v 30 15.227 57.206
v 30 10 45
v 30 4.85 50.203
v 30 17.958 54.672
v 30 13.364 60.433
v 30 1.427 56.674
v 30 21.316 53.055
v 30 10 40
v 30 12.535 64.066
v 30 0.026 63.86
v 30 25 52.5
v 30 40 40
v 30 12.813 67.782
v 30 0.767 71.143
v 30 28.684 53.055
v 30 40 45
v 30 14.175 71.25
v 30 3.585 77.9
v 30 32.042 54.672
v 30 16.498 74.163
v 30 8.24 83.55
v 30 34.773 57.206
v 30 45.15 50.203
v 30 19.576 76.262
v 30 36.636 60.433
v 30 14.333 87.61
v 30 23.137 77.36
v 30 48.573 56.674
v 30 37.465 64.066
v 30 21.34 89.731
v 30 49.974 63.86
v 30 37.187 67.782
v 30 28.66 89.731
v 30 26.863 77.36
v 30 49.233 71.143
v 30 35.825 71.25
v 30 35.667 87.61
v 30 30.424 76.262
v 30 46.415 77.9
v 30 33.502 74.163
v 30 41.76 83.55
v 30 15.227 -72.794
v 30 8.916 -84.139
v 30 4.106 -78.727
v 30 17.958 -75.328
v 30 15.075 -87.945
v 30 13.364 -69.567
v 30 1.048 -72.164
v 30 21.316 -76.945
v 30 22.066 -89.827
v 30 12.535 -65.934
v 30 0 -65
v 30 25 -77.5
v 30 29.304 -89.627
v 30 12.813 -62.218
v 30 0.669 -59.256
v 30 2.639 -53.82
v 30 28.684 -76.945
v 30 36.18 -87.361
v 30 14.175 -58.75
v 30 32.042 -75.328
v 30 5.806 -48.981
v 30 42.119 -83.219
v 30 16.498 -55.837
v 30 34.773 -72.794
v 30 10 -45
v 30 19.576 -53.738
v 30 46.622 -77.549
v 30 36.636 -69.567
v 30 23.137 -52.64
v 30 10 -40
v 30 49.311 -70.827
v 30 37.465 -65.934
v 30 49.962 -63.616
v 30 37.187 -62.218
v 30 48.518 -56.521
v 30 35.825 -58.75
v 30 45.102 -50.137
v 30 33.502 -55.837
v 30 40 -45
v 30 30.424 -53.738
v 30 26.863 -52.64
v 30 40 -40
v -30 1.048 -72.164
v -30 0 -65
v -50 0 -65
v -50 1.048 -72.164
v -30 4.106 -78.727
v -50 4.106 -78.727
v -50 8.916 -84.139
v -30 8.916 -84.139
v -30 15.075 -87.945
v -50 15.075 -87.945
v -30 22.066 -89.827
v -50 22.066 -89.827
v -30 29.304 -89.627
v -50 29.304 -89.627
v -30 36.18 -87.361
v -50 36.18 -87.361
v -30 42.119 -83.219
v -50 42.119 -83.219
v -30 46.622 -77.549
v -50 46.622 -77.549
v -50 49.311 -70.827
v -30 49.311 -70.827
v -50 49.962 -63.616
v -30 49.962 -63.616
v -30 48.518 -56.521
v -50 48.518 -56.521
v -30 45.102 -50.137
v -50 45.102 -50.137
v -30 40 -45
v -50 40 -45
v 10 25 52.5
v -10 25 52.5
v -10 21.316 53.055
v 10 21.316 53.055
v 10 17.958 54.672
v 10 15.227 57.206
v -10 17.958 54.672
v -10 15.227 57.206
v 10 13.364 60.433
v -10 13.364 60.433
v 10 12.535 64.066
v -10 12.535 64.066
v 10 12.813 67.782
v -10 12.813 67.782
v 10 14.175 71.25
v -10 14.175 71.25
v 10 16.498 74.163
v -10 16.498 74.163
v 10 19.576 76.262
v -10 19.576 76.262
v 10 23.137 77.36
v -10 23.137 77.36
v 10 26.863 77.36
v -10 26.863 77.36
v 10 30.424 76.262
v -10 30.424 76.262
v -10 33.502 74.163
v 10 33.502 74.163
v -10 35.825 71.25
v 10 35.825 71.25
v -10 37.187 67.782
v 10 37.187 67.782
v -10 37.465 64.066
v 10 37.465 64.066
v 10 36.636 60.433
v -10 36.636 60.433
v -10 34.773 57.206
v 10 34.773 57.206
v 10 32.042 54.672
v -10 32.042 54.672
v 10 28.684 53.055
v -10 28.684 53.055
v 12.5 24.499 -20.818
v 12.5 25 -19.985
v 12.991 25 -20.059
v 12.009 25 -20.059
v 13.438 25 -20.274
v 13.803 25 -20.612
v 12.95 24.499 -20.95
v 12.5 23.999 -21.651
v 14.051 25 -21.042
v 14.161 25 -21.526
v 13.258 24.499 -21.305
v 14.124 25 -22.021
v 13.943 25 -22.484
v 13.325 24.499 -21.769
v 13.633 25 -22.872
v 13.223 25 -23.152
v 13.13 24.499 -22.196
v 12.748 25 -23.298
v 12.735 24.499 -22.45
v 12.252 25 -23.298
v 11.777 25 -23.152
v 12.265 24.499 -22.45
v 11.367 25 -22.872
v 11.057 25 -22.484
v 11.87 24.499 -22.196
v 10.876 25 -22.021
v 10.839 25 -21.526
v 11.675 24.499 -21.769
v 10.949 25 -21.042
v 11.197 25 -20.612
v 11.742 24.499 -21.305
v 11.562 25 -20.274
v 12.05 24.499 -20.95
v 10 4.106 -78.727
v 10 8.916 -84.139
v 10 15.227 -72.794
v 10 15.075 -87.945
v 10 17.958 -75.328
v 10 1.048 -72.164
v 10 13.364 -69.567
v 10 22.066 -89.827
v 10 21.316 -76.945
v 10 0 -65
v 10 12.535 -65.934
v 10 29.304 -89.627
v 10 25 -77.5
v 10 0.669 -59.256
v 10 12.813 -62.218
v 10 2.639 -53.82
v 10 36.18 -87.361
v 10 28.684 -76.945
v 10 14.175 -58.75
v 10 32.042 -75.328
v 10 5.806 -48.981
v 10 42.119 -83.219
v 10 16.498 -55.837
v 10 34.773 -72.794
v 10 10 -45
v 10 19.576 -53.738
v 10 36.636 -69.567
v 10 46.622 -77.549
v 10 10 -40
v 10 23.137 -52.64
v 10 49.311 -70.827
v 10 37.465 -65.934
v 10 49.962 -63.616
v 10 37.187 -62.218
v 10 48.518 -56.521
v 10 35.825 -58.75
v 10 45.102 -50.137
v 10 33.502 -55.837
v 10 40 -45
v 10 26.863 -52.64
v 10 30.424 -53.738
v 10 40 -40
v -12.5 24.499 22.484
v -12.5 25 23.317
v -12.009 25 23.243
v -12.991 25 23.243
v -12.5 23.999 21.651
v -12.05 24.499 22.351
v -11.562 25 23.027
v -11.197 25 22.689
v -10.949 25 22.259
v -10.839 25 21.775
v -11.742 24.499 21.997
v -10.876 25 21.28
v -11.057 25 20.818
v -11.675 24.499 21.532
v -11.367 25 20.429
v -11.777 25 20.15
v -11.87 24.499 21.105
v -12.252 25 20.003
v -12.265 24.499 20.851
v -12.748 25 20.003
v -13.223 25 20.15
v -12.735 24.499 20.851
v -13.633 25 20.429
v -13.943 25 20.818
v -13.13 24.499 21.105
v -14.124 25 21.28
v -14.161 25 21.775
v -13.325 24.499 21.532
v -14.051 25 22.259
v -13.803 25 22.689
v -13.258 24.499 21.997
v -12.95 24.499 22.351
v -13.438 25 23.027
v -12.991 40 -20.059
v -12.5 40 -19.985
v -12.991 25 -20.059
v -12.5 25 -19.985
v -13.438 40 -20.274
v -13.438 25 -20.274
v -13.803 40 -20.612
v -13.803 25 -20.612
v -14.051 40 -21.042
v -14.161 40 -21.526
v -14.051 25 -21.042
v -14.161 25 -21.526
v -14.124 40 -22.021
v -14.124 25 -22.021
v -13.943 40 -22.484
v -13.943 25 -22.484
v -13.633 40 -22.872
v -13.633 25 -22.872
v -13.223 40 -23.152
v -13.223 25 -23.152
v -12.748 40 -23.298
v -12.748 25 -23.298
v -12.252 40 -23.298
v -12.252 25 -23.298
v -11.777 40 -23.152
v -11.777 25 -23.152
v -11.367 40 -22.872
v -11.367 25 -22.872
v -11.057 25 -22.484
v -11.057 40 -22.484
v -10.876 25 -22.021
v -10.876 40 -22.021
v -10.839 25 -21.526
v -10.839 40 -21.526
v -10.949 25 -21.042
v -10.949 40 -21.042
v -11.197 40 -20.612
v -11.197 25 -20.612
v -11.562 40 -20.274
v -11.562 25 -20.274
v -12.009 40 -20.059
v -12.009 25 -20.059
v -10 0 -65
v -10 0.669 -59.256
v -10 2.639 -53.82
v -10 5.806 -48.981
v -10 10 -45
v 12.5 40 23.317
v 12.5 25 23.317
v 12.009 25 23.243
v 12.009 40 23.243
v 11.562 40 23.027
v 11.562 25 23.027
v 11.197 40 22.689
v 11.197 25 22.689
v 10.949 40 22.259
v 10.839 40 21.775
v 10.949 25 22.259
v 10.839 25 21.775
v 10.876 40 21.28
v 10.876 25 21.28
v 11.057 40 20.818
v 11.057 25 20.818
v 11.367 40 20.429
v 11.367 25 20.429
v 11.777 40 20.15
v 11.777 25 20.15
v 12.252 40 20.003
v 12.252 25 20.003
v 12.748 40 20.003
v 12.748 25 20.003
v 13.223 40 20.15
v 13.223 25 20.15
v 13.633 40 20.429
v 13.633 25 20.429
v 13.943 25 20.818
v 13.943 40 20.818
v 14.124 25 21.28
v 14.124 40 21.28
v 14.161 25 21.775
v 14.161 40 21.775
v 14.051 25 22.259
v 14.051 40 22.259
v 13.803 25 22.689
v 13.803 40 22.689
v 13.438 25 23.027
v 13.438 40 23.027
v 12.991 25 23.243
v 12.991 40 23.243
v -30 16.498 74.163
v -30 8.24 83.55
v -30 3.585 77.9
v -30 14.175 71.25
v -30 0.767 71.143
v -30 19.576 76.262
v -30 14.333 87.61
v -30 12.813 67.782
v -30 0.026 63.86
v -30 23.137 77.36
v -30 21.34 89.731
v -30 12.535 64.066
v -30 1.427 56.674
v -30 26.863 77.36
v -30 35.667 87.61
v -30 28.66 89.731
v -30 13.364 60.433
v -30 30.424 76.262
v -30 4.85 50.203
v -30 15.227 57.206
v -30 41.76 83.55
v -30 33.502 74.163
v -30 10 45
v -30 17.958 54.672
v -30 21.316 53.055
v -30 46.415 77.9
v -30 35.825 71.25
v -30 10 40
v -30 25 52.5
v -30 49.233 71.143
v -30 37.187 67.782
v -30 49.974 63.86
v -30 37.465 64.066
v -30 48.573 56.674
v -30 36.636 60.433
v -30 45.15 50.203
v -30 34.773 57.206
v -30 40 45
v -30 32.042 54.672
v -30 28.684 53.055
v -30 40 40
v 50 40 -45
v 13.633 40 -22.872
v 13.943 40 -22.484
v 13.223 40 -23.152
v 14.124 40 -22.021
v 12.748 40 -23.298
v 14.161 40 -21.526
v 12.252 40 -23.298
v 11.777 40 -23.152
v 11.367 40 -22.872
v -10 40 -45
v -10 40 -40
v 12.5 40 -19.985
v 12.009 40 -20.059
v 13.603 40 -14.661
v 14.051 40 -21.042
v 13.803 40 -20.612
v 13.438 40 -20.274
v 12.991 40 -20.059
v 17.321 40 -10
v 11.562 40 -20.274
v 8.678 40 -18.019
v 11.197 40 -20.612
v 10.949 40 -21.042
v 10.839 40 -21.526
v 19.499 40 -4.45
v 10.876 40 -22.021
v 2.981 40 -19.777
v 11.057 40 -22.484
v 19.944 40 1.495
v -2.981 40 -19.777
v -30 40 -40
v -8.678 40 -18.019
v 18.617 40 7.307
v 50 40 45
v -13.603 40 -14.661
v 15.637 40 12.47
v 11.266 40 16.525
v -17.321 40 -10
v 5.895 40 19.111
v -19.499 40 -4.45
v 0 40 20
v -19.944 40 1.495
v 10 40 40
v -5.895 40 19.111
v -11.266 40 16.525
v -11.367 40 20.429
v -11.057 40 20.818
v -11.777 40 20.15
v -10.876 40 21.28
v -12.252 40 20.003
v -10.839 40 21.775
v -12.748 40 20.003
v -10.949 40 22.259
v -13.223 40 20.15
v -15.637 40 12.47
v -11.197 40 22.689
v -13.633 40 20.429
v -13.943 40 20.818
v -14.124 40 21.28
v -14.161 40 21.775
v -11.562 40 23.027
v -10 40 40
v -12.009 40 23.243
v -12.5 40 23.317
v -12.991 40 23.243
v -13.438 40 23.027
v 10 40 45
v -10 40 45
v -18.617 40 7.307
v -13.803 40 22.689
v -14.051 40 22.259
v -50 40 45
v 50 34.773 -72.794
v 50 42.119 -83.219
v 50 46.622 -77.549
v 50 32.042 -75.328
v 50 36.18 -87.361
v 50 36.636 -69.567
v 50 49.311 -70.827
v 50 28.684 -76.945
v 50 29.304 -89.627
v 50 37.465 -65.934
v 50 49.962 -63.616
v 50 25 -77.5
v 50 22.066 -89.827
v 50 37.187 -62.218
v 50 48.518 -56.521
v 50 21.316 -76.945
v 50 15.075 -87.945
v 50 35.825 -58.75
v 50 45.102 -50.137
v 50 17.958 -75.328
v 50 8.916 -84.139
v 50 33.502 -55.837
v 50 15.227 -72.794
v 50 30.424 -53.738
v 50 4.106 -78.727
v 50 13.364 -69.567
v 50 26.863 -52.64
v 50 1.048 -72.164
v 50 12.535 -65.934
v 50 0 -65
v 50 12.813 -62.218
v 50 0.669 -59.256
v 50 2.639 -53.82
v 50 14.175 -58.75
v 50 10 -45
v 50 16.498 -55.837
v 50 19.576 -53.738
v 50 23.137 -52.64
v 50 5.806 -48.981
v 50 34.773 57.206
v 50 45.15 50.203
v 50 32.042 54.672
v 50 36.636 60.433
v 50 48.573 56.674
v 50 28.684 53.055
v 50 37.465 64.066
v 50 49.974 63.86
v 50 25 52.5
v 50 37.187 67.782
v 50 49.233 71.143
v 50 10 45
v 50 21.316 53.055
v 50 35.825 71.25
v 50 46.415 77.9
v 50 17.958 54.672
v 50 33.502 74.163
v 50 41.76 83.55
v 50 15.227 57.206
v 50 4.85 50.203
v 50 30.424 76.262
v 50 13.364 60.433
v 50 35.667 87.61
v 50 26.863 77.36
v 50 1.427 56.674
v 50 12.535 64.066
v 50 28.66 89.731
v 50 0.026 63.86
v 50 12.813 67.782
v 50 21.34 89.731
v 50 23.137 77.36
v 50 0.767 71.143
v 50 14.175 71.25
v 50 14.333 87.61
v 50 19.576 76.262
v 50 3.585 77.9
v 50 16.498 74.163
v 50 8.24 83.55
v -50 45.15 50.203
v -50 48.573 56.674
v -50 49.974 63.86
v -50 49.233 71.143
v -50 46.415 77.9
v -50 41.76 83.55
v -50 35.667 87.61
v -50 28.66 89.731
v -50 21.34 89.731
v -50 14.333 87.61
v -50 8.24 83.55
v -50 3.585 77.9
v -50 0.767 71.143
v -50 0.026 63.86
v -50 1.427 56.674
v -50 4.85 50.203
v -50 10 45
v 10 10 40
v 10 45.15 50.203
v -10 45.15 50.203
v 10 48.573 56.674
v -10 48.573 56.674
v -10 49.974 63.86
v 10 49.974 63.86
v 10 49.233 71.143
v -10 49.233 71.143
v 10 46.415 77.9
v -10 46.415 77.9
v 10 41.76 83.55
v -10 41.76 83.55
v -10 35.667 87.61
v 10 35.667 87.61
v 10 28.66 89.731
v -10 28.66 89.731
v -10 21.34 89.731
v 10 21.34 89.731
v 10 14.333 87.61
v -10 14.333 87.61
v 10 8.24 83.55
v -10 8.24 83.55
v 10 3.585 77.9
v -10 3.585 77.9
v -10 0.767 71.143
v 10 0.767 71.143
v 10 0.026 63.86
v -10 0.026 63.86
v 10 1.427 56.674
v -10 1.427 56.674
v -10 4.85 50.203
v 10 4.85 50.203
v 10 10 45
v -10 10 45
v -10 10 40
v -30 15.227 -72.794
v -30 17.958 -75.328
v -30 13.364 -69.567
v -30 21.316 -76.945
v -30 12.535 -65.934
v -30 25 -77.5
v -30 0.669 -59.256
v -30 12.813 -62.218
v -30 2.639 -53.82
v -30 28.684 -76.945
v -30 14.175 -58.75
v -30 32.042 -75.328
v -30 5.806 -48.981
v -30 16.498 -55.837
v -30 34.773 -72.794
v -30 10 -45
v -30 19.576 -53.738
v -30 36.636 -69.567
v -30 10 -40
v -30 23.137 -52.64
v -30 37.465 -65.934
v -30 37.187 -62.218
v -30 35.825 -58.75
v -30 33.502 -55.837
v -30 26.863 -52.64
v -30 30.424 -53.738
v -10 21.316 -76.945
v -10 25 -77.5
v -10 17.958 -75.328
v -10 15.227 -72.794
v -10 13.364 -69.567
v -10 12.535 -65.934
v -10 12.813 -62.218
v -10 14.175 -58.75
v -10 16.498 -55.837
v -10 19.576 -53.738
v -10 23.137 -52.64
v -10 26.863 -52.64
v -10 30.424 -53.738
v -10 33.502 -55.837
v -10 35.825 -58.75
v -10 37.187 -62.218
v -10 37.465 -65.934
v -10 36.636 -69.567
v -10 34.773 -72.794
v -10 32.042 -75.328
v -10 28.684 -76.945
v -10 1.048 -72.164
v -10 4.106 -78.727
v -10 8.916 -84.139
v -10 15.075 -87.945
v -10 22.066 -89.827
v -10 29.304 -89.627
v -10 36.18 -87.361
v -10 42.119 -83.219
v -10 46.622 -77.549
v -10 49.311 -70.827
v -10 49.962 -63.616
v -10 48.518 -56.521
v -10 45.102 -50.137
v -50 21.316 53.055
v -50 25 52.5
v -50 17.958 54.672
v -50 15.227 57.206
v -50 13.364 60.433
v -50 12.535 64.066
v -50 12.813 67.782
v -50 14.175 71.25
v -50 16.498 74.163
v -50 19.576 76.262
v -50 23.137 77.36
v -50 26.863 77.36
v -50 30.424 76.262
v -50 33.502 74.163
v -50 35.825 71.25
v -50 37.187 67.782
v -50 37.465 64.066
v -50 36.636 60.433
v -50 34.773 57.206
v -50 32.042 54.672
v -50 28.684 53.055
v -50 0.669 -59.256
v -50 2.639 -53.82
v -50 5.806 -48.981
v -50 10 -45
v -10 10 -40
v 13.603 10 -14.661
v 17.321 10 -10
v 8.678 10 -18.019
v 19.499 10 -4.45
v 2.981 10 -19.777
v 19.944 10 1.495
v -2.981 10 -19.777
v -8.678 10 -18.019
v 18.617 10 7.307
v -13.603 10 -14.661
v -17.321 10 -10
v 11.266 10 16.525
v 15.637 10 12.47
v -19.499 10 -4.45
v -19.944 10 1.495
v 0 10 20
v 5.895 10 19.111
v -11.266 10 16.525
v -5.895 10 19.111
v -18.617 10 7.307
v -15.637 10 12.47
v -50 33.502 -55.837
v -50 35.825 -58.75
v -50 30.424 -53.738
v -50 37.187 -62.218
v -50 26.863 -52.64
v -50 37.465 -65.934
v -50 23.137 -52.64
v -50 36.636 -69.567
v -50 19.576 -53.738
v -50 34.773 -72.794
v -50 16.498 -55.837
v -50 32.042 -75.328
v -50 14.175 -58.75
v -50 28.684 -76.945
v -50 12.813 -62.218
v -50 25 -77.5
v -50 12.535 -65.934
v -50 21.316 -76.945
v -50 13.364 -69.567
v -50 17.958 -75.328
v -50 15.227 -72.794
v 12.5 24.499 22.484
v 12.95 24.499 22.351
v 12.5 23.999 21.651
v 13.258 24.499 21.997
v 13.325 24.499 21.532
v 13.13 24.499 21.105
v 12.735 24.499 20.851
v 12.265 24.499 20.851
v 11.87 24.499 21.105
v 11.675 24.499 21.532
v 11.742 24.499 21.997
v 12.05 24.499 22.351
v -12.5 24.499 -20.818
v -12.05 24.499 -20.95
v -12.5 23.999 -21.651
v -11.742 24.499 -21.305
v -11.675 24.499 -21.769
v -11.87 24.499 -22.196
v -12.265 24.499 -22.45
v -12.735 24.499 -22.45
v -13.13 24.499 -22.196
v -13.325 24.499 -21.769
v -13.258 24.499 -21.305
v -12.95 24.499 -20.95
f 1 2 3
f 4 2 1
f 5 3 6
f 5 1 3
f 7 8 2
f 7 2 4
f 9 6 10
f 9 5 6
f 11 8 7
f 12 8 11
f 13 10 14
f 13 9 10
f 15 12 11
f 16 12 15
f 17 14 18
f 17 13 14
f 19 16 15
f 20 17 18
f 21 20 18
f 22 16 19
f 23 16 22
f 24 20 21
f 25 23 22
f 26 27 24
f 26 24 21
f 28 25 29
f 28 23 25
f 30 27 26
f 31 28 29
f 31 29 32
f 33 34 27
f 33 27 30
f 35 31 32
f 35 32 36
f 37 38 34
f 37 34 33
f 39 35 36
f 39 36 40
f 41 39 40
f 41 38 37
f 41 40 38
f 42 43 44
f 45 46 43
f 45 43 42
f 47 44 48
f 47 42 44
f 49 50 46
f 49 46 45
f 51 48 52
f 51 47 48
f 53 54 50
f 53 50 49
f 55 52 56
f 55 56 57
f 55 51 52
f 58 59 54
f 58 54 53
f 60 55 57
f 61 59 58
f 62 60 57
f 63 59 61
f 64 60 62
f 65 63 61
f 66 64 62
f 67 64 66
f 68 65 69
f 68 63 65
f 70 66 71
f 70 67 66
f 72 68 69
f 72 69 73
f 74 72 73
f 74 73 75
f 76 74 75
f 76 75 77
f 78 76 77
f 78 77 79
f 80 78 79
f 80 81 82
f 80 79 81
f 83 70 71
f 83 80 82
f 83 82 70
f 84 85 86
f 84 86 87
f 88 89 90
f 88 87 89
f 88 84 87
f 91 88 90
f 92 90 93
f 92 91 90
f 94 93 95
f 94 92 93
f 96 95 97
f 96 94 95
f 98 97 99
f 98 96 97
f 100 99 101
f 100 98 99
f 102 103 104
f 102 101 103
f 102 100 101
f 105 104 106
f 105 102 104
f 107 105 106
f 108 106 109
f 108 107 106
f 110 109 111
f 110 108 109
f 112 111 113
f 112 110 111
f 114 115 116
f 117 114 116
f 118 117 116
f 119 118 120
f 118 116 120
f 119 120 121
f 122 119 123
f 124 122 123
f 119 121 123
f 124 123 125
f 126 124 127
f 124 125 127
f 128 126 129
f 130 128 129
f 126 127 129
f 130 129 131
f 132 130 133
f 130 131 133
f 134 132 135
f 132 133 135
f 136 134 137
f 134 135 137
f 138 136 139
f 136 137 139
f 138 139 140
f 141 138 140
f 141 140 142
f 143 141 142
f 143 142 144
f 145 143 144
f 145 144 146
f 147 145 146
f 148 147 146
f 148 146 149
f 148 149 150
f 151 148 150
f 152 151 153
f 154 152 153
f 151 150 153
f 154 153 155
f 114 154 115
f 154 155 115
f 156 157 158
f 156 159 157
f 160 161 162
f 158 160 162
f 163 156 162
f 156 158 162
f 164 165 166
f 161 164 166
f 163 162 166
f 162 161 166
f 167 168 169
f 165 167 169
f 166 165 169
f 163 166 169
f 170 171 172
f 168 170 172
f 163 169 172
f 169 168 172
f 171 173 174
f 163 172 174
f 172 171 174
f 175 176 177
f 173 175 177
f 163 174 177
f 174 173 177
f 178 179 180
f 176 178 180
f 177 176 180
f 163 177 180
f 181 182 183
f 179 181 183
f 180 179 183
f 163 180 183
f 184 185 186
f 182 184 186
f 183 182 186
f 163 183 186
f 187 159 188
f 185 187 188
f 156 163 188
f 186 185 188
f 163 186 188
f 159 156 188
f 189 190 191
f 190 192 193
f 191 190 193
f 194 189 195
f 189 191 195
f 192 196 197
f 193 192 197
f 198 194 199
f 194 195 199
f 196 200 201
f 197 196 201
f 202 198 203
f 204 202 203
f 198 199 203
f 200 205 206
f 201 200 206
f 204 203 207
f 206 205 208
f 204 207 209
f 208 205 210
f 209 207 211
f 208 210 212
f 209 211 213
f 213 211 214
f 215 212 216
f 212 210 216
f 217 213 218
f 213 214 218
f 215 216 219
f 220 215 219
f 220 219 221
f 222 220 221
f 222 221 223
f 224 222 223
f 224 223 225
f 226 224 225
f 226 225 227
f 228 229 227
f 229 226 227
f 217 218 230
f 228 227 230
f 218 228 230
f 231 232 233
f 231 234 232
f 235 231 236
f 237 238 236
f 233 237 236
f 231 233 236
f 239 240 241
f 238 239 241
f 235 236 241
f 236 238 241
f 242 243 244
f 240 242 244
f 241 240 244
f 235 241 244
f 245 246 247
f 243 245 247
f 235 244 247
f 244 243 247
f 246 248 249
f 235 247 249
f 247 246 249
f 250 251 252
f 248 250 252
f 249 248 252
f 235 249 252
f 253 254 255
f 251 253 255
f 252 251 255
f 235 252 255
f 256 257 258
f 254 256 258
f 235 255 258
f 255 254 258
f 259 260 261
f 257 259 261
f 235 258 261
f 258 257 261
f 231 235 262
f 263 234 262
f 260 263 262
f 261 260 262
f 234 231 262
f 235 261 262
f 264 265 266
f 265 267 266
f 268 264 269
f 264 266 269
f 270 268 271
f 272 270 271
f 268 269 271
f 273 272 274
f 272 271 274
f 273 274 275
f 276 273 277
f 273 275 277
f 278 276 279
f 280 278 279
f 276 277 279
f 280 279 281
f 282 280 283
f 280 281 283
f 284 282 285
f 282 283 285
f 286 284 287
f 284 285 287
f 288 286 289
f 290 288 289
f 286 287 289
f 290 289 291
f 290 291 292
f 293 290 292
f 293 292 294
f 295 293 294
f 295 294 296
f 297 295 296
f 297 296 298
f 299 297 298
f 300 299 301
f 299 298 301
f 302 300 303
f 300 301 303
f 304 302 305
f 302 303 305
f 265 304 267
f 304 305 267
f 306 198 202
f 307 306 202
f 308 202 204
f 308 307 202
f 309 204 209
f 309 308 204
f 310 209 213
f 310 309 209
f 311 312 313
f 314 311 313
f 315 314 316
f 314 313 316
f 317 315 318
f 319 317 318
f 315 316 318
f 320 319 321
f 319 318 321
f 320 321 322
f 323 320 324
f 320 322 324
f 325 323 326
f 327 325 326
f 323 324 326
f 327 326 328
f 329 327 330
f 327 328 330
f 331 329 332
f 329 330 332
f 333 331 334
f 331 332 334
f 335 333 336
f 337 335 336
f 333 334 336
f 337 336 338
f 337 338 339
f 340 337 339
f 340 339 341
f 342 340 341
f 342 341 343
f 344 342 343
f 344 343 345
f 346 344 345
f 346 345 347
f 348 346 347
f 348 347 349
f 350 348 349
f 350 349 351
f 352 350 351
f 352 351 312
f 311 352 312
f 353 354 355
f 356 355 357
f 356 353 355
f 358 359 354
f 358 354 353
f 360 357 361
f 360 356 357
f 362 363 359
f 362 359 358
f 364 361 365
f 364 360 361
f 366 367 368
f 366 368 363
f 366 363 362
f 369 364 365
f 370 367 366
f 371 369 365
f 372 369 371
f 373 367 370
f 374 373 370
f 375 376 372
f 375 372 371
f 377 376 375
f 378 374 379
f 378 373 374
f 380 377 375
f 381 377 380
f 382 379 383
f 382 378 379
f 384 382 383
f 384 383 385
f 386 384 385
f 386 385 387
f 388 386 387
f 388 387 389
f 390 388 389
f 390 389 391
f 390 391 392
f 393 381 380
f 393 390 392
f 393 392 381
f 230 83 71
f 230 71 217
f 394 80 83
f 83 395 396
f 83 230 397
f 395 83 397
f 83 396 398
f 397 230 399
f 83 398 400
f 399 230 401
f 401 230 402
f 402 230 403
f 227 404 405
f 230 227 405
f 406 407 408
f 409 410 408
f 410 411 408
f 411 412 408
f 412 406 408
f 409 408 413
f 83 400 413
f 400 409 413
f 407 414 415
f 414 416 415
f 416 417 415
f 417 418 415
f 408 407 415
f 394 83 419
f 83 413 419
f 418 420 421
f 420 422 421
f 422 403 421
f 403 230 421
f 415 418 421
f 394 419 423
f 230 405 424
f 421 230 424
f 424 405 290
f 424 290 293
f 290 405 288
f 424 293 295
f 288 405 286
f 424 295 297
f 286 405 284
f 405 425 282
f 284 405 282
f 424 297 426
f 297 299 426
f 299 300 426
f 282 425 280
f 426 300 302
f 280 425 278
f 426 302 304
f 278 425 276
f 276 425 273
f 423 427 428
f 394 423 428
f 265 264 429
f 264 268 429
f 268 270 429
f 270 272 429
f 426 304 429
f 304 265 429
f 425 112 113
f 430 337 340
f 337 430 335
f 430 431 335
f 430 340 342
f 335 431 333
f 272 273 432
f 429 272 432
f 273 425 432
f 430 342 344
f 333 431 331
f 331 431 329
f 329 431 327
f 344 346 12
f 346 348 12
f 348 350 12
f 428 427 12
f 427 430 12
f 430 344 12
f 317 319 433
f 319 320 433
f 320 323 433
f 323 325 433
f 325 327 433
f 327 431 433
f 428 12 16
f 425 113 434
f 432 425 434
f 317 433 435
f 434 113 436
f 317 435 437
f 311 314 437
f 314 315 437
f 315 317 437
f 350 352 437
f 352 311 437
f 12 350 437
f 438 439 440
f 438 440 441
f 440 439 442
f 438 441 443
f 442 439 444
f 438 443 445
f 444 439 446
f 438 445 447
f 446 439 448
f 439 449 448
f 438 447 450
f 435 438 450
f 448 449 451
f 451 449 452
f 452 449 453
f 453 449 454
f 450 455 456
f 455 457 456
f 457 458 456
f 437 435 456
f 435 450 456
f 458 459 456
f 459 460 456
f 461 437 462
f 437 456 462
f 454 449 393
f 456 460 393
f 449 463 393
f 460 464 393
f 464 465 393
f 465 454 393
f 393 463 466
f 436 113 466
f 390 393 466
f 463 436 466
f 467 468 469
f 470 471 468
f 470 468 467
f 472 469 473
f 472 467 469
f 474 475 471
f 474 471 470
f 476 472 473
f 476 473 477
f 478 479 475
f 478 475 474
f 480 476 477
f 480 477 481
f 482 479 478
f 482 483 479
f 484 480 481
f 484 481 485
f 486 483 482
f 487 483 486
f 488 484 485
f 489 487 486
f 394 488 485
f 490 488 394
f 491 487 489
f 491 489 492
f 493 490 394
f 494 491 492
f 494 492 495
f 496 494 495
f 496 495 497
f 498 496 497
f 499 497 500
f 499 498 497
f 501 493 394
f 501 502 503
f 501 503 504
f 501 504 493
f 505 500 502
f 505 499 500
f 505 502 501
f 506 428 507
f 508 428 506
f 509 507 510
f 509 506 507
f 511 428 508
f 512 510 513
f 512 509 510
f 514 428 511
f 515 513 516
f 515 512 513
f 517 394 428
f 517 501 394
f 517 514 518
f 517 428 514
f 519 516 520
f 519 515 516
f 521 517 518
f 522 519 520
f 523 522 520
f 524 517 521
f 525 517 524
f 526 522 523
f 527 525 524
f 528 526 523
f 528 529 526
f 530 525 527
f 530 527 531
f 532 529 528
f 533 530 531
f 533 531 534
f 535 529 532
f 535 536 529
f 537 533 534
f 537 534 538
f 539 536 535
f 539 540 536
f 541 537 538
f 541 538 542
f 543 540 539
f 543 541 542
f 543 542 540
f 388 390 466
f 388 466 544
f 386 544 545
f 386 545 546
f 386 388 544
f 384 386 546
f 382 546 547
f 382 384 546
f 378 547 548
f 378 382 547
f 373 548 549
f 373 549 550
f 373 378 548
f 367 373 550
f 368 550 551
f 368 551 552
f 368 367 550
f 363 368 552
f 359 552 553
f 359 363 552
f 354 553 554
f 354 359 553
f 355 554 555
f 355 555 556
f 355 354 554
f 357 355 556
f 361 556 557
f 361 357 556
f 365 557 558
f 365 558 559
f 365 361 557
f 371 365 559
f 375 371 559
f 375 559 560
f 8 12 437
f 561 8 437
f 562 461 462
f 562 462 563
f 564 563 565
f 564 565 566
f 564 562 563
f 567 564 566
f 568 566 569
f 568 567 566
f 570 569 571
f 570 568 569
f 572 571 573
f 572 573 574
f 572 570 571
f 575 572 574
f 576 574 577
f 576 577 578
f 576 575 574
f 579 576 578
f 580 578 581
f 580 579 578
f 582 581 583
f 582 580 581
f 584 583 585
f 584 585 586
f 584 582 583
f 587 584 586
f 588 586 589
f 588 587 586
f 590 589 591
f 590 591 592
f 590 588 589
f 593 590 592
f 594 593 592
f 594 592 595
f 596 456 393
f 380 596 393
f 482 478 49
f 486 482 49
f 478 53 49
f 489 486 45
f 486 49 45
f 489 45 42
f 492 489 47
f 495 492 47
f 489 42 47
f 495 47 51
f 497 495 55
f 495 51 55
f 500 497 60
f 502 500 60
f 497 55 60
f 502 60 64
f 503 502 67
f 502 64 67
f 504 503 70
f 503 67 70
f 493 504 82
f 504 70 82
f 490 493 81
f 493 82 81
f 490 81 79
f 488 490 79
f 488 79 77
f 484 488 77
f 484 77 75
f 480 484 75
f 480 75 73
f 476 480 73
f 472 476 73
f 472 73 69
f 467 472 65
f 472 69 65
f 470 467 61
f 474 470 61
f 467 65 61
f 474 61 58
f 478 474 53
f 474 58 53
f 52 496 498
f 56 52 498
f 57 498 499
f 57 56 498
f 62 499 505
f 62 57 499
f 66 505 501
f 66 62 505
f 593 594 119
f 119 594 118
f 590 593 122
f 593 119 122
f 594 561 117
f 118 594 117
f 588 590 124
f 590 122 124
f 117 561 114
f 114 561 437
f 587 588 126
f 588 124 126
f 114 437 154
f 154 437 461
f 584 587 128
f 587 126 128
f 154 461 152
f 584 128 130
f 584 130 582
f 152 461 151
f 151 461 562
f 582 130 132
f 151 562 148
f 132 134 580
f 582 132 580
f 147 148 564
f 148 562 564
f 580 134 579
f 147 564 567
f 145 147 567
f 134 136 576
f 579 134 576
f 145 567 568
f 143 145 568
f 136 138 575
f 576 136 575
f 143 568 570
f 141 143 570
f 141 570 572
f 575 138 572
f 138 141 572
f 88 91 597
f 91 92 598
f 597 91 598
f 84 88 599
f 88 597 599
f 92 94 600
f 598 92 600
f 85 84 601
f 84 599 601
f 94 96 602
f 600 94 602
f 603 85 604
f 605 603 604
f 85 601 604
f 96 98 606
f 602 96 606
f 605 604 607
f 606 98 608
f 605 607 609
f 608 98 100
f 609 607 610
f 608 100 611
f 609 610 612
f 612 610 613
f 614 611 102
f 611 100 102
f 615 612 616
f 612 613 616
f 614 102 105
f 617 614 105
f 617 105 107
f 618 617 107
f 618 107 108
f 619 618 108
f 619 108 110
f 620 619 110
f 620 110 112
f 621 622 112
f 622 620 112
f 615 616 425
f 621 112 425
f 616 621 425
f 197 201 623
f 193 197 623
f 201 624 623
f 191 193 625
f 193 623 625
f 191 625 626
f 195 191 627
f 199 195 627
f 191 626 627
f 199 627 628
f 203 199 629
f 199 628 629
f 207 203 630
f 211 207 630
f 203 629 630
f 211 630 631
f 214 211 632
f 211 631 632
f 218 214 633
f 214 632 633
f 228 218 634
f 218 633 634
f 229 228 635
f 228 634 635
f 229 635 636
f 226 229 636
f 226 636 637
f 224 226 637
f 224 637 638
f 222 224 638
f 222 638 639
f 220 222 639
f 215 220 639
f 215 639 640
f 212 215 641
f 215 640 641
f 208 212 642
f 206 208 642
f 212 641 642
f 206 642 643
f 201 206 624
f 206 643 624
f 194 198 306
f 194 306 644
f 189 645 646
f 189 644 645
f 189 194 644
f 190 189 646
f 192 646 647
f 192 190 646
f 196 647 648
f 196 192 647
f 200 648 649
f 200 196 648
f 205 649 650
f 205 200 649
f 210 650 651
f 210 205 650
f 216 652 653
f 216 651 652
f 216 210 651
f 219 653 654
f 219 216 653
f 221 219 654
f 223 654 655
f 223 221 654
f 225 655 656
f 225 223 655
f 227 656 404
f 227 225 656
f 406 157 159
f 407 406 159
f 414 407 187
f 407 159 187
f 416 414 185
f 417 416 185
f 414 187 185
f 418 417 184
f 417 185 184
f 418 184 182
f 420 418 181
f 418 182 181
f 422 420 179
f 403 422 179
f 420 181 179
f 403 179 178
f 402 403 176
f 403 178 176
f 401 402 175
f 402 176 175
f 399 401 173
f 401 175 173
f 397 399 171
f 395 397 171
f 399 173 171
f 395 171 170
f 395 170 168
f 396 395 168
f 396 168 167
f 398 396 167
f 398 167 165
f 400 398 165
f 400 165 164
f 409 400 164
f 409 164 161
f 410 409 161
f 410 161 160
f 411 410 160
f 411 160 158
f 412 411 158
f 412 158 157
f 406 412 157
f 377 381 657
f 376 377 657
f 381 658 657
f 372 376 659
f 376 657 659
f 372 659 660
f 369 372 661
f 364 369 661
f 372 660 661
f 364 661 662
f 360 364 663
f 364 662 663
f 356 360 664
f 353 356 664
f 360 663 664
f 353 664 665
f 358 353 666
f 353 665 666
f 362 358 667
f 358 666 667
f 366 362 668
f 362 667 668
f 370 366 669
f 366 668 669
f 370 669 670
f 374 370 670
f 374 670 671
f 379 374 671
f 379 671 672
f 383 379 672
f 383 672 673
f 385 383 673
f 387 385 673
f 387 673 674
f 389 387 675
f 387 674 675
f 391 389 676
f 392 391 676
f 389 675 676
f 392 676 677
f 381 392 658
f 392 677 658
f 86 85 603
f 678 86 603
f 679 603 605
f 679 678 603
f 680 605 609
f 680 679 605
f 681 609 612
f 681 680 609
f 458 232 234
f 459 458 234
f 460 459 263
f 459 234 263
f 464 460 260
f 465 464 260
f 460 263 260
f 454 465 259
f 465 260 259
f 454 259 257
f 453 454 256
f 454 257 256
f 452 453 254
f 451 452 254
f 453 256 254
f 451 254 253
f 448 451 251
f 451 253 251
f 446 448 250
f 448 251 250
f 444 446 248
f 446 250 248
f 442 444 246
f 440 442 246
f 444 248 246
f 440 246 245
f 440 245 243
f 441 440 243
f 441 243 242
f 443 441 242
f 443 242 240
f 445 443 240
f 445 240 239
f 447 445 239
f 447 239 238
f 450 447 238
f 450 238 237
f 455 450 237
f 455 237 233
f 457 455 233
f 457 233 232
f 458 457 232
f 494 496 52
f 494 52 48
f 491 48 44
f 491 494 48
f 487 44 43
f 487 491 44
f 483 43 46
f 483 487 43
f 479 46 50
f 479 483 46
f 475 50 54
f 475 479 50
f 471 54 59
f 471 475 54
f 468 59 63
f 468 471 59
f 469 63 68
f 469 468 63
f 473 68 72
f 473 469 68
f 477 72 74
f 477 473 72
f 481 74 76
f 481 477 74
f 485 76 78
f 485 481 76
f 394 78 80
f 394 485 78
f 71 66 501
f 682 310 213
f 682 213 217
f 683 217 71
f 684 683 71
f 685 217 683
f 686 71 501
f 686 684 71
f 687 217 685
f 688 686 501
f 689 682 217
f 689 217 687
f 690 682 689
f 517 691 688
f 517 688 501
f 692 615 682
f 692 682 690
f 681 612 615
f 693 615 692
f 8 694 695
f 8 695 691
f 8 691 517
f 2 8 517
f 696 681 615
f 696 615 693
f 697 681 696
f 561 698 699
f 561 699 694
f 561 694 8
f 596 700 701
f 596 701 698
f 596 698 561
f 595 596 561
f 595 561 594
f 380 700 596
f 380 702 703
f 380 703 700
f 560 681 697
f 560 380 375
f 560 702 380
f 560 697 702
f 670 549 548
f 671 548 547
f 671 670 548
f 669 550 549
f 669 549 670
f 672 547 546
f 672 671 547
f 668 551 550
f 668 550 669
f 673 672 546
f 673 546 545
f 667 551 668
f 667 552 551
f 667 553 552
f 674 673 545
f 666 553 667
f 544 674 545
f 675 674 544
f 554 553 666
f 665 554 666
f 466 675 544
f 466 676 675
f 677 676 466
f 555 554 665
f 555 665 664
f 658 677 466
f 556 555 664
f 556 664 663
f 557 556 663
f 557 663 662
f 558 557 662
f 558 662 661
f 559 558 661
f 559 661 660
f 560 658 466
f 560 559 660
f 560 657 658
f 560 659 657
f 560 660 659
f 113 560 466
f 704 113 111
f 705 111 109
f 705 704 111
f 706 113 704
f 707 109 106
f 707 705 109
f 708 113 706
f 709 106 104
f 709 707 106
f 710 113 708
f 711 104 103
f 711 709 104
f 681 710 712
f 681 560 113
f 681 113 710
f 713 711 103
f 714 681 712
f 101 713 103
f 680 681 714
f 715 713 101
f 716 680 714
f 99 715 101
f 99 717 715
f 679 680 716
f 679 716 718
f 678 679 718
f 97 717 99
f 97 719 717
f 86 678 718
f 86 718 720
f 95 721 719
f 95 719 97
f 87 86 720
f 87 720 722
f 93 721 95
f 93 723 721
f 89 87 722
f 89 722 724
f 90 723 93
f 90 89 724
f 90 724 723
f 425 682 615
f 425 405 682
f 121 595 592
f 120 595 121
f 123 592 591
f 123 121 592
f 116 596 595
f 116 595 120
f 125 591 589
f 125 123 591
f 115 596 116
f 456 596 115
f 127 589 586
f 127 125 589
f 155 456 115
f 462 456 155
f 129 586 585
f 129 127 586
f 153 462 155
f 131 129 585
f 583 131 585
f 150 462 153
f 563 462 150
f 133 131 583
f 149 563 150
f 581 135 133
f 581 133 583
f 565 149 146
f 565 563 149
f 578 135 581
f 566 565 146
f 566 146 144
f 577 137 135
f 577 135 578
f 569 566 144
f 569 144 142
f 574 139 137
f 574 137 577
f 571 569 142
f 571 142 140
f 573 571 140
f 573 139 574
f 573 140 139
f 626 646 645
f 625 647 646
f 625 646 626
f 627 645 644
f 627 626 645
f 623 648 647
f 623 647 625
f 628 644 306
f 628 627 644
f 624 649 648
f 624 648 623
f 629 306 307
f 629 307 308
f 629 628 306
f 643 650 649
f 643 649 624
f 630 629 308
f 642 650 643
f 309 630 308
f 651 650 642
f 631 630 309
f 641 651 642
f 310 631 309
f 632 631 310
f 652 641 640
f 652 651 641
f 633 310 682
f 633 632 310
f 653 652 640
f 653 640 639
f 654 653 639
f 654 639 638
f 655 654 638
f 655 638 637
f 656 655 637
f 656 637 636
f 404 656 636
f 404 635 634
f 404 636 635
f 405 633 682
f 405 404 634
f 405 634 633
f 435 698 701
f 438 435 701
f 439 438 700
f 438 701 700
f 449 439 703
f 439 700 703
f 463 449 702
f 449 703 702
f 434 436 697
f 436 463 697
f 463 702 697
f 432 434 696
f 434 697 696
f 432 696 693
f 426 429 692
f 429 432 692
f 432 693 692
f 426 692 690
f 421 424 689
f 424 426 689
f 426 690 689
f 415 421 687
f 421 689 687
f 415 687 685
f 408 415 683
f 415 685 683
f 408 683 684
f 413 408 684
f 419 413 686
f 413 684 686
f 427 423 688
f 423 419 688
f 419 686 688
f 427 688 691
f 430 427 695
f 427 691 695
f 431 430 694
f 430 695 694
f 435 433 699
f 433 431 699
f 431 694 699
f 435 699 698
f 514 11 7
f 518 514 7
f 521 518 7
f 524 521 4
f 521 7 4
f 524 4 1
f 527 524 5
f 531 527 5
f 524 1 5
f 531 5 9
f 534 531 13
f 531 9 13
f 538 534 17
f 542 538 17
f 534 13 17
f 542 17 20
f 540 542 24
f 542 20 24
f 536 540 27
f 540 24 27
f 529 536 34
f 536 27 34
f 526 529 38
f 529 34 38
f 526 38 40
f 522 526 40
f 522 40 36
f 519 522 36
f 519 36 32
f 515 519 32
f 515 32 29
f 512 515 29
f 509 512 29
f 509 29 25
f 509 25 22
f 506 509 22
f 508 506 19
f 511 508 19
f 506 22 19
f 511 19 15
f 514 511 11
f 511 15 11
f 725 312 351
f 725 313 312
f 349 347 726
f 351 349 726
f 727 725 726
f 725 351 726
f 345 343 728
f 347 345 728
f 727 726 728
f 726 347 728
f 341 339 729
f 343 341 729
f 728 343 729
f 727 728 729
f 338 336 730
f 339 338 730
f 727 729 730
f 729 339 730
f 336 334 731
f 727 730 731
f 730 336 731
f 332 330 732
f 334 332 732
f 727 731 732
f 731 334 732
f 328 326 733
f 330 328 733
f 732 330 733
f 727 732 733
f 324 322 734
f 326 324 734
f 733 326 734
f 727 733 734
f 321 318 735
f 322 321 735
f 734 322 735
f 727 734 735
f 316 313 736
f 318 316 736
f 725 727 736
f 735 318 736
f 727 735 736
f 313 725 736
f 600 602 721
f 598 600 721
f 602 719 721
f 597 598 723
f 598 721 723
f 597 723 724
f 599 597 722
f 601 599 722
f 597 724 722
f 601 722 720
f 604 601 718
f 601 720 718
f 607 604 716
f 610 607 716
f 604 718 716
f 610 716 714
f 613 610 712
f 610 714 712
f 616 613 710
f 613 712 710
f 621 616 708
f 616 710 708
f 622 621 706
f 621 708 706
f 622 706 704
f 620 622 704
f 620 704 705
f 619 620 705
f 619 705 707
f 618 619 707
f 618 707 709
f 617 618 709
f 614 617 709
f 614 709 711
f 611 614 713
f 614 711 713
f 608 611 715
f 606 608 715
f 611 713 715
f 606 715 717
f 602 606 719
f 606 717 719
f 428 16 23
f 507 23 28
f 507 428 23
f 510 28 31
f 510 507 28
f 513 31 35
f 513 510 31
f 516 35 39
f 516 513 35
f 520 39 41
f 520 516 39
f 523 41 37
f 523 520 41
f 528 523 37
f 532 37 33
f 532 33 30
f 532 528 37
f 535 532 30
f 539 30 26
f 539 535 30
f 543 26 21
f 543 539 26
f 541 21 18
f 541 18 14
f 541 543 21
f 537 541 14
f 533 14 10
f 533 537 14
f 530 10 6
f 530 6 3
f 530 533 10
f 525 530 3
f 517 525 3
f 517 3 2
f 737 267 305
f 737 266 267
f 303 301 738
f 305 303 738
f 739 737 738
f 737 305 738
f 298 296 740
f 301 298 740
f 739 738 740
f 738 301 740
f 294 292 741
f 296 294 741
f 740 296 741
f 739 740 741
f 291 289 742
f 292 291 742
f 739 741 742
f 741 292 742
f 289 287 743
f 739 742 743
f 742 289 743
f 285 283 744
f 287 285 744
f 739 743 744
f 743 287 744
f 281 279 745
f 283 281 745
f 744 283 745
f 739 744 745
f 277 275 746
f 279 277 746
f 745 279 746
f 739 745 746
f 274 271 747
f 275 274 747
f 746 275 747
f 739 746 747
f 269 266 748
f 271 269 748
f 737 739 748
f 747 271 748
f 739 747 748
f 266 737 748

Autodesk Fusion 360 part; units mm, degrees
sketch "Sketch1" plane through (0, 0, 0) normal (0, 1, 0) x (1, 0, 0)
  line L0 (55, -90) -> (-55, -90)
  line L1 (-55, -90) -> (-55, 90)
  line L2 (-55, 90) -> (55, 90)
  line L3 (55, 90) -> (55, -90)
  line L4 (55, -90) -> (-55, 90) construction
  line L5 (-55, -90) -> (55, 90) construction
  dimension "d1" = 180
  dimension "d2" = 110
extrude "Extrude1" add sketch "Sketch1" along normal blind 50
sketch "Sketch2" plane through (0, 50, 0) normal (0, 1, 0) x (-1, 0, 0)
  line L0 (-55, -90) -> (55, -90)
  line L1 (55, -90) -> (55, 90)
  line L2 (55, 90) -> (-55, 90)
  line L3 (-55, 90) -> (-55, -90)
  line L4 (55, -90) -> (30, -90)
  line L5 (30, -90) -> (30, -40)
  line L6 (30, -40) -> (55, -40)
  line L7 (55, -40) -> (55, -90)
  line L8 (30, -90) -> (10, -90)
  line L9 (10, -90) -> (10, -40)
  line L10 (10, -40) -> (30, -40)
  line L11 (30, -40) -> (30, -90)
  line L12 (10, -90) -> (-10, -90)
  line L13 (-10, -90) -> (-10, -40)
  line L14 (-10, -40) -> (10, -40)
  line L15 (10, -40) -> (10, -90)
  line L16 (-10, -90) -> (-30, -90)
  line L17 (-30, -90) -> (-30, -40)
  line L18 (-30, -40) -> (-10, -40)
  line L19 (-10, -40) -> (-10, -90)
  line L20 (-30, -90) -> (-55, -90)
  line L21 (-55, -90) -> (-55, -40)
  line L22 (-55, -40) -> (-30, -40)
  line L23 (-30, -40) -> (-30, -90)
  line L24 (55, 0) -> (-55, 0)
  line L25 (55, 90) -> (30, 90)
  line L26 (-10, 40) -> (10, 40)
  line L27 (-30, 40) -> (-30, 90)
  line L28 (-55, 90) -> (55, 90)
  line L29 (-30, 40) -> (-10, 40)
  line L30 (-30, 90) -> (-30, 40)
  line L31 (30, 90) -> (10, 90)
  line L32 (-10, 90) -> (-30, 90)
  line L33 (-55, 90) -> (-55, 40)
  line L34 (10, 40) -> (30, 40)
  line L35 (-10, 40) -> (-10, 90)
  line L36 (30, 90) -> (30, 40)
  line L37 (-55, 40) -> (-30, 40)
  line L38 (30, 40) -> (55, 40)
  line L39 (30, 40) -> (30, 90)
  line L40 (-30, 90) -> (-55, 90)
  line L41 (10, 40) -> (10, 90)
  line L42 (-10, 90) -> (-10, 40)
  line L43 (10, 90) -> (-10, 90)
  line L44 (10, 90) -> (10, 40)
  line L45 (55, 40) -> (55, 90)
  dimension "d5" = 25
  dimension "d6" = 50
  dimension "d7" = 20
  dimension "d8" = 20
  dimension "d9" = 20
  dimension "d10" = 25
  dimension "d11" = 50
  dimension "d12" = 50
  dimension "d13" = 50
  dimension "d14" = 50
  dimension "d15" = 110
extrude "Extrude2" cut sketch "Sketch2" against normal blind 50 contours L0 L13 L16 L17 L18 L19 L23 | L0 L5 L8 L9 L10 L11 L15 | L2 L27 L28 L29 L30 L32 L35 L42 | L2 L28 L31 L34 L36 L39 L41 L44
sketch "Sketch3" plane through (0, 50, 0) normal (0, 1, 0) x (-1, 0, 0)
  line L0 (-10, -40) -> (-10, -90)
  line L1 (-10, -90) -> (10, -90)
  line L2 (10, -90) -> (10, -40)
  line L3 (10, -40) -> (30, -40)
  line L4 (30, -40) -> (30, -90)
  line L5 (30, -90) -> (55, -90)
  line L6 (55, -90) -> (55, 90)
  line L7 (55, 90) -> (30, 90)
  line L8 (30, 90) -> (30, 40)
  line L9 (30, 40) -> (10, 40)
  line L10 (10, 40) -> (10, 90)
  line L11 (10, 90) -> (-10, 90)
  line L12 (-10, 90) -> (-10, 40)
  line L13 (-10, 40) -> (-30, 40)
  line L14 (-30, 40) -> (-30, 90)
  line L15 (-30, 90) -> (-55, 90)
  line L16 (-55, 90) -> (-55, -90)
  line L17 (-55, -90) -> (-30, -90)
  line L18 (-30, -90) -> (-30, -40)
  line L19 (-30, -40) -> (-10, -40)
hole "Hole1" at (0, 50, 0) direction (0, -1, 0) diameter 40 end through all
sketch "Sketch4" plane through (55, 0, 0) normal (1, 0, 0) x (0, 0, -1)
  line L0 (-90, 0) -> (90, 0)
  line L1 (90, 0) -> (90, 50)
  line L2 (90, 50) -> (-90, 50)
  line L3 (-90, 50) -> (-90, 0)
  circle A0 centre (65, 25) radius 25
  circle A1 centre (-65, 25) radius 25
  dimension "d21" = 50
  dimension "d23" = 50
  dimension "d24" = 65
  dimension "d25" = 25
  dimension "d26" = 25
  dimension "d27" = 65
extrude "Extrude3" cut sketch "Sketch4" against normal blind 110 contours L0 L3 A1 | L2 L3 A1 | L0 L1 A0 | L1 L2 A0
sketch "Sketch5" plane through (55, 0, 0) normal (1, 0, 0) x (0, 0, -1)
  arc A0 (-65, 50) -> (-65, 0) centre (-65, 25) ccw
  line L0 (-65, 0) -> (65, 0)
  arc A1 (65, 0) -> (65, 50) centre (65, 25) ccw
  line L1 (65, 50) -> (-65, 50)
  line L2 (-65, 25) -> (65, 25)
hole "Hole2" at (55, 25, 65) at (55, 25, -65) direction (-1, 0, 0) diameter 25 end through all
extrude "Extrude4" cut 1 faces at (55, 5.9862, 18.224) along direction (-1, 0, 0) blind 5
extrude "Extrude5" cut 1 faces at (-55, 5.9862, 18.224) along direction (1, 0, 0) blind 5
sketch "Sketch6" plane through (0, 50, 0) normal (0, 1, 0) x (-1, 0, 0)
  circle A0 centre (0, 0) radius 20
  line L0 (50, -65) -> (50, 65)
  line L1 (50, 65) -> (30, 65)
  line L2 (30, 65) -> (30, 40)
  line L3 (30, 40) -> (10, 40)
  line L4 (10, 40) -> (10, 65)
  line L5 (10, 65) -> (-10, 65)
  line L6 (-10, 65) -> (-10, 40)
  line L7 (-10, 40) -> (-30, 40)
  line L8 (-30, 40) -> (-30, 65)
  line L9 (-30, 65) -> (-50, 65)
  line L10 (-50, 65) -> (-50, -65)
  line L11 (-50, -65) -> (-30, -65)
  line L12 (-30, -65) -> (-30, -40)
  line L13 (-30, -40) -> (-10, -40)
  line L14 (-10, -40) -> (-10, -65)
  line L15 (-10, -65) -> (10, -65)
  line L16 (10, -65) -> (10, -40)
  line L17 (10, -40) -> (30, -40)
  line L18 (30, -40) -> (30, -65)
  line L19 (30, -65) -> (50, -65)
  line L20 (-50, -40) -> (50, -40)
  line L21 (50, -40) -> (50, 40)
  line L22 (50, 40) -> (-50, 40)
  line L23 (-50, 40) -> (-50, -40)
  line L24 (-50, -40) -> (50, 40) construction
  line L25 (50, -40) -> (-50, 40) construction
  dimension "d37" = 80
  dimension "d38" = 100
extrude "Extrude6" cut sketch "Sketch6" against normal blind 10 contours L0 L3 L7 L10 L13 L17 L20 L21 L22 L23
sketch "Sketch7" plane through (-50, 0, 0) normal (-1, 0, 0) x (0, 0, 1)
  line L0 (-40, 40) -> (-40, 50)
  line L1 (-40, 50) -> (-65, 50)
  arc A0 (-65, 50) -> (-65, 0) centre (-65, 25) ccw
  line L2 (-65, 0) -> (65, 0)
  arc A1 (65, 0) -> (65, 50) centre (65, 25) ccw
  line L3 (65, 50) -> (40, 50)
  line L4 (40, 50) -> (40, 40)
  line L5 (40, 40) -> (-40, 40)
  circle A2 centre (65, 25) radius 12.5
  circle A3 centre (-65, 25) radius 12.5
  circle A4 centre (-65, 25) radius 25
  circle A5 centre (65, 25) radius 25
  line L6 (-40, 40) -> (-45, 40)
  line L7 (40, 40) -> (45, 40)
extrude "Extrude7" cut sketch "Sketch7" against normal blind 100 contours L0 L1 A4 L6 | L3 L4 A5 L7
sketch "Sketch8" plane through (0, 0, 0) normal (0, -1, 0) x (1, 0, 0)
  line L0 (-50, 65) -> (-50, -65)
  line L1 (-50, -65) -> (-30, -65)
  line L2 (-30, -65) -> (-30, -40)
  line L3 (-30, -40) -> (-10, -40)
  line L4 (-10, -40) -> (-10, -65)
  line L5 (-10, -65) -> (10, -65)
  line L6 (10, -65) -> (10, -40)
  line L7 (10, -40) -> (30, -40)
  line L8 (30, -40) -> (30, -65)
  line L9 (30, -65) -> (50, -65)
  line L10 (50, -65) -> (50, 65)
  line L11 (50, 65) -> (30, 65)
  line L12 (30, 65) -> (30, 40)
  line L13 (30, 40) -> (10, 40)
  line L14 (10, 40) -> (10, 65)
  line L15 (10, 65) -> (-10, 65)
  line L16 (-10, 65) -> (-10, 40)
  line L17 (-10, 40) -> (-30, 40)
  line L18 (-30, 40) -> (-30, 65)
  line L19 (-30, 65) -> (-50, 65)
  circle A0 centre (0, 0) radius 20
  line L20 (50, 40) -> (-50, 40)
  line L21 (-50, 40) -> (-50, -40)
  line L22 (-50, -40) -> (50, -40)
  line L23 (50, -40) -> (50, 40)
  line L24 (50, 40) -> (-50, -40) construction
  line L25 (-50, 40) -> (50, -40) construction
  dimension "d43" = 80
extrude "Extrude8" cut sketch "Sketch8" against normal blind 10 contours L0 L3 L7 L10 L13 L17 L20 L21 L22 L23
sketch "Sketch9" plane through (-50, 0, 0) normal (-1, 0, 0) x (0, 0, 1)
  line L0 (40, 10) -> (40, 0)
  line L1 (40, 0) -> (65, 0)
  arc A0 (65, 0) -> (45, 40) centre (65, 25) ccw
  line L2 (45, 40) -> (-45, 40)
  arc A1 (-45, 40) -> (-65, 50) centre (-65, 25) ccw
  arc A2 (-65, 50) -> (-65, 0) centre (-65, 25) ccw
  line L3 (-65, 0) -> (-40, 0)
  line L4 (-40, 0) -> (-40, 10)
  line L5 (-40, 10) -> (40, 10)
  circle A3 centre (65, 25) radius 12.5
  circle A4 centre (-65, 25) radius 12.5
  circle A5 centre (-65, 25) radius 25
  circle A6 centre (65, 25) radius 25
  line L6 (-40, 10) -> (-45, 10)
  line L7 (40, 10) -> (45, 10)
  dimension "d46" = 50
extrude "Extrude9" cut sketch "Sketch9" against normal blind 100 contours L0 L1 A6 L7 | L3 L4 A5 L6
sketch "Sketch10" plane through (0, 40, 0) normal (0, 1, 0) x (-1, 0, 0)
  circle A0 centre (0, 0) radius 20
  line L0 (-50, 45) -> (-50, -45)
  line L1 (-50, -45) -> (-30, -45)
  line L2 (-30, -45) -> (-30, -40)
  line L3 (-30, -40) -> (-10, -40)
  line L4 (-10, -40) -> (-10, -45)
  line L5 (-10, -45) -> (10, -45)
  line L6 (10, -45) -> (10, -40)
  line L7 (10, -40) -> (30, -40)
  line L8 (30, -40) -> (30, -45)
  line L9 (30, -45) -> (50, -45)
  line L10 (50, -45) -> (50, 45)
  line L11 (50, 45) -> (30, 45)
  line L12 (30, 45) -> (30, 40)
  line L13 (30, 40) -> (10, 40)
  line L14 (10, 40) -> (10, 45)
  line L15 (10, 45) -> (-10, 45)
  line L16 (-10, 45) -> (-10, 40)
  line L17 (-10, 40) -> (-30, 40)
  line L18 (-30, 40) -> (-30, 45)
  line L19 (-30, 45) -> (-50, 45)
sketch "Sketch11" plane through (0, 50, 0) normal (0, 1, 0) x (-1, 0, 0)
  line L0 (23, -18.071) -> (23, 18.071)
  arc A0 (23, 18.071) -> (-23, 18.071) centre (0, 0) ccw
  line L1 (-23, 18.071) -> (-23, -18.071)
  arc A1 (-23, -18.071) -> (23, -18.071) centre (0, 0) ccw
  circle A2 centre (0, 0) radius 12
  circle A3 centre (12.5, 21.6506) radius 2.25
  circle A4 centre (12.5, -21.6506) radius 2.25
  circle A5 centre (-12.5, -21.6506) radius 2.25
  circle A6 centre (-12.5, 21.6506) radius 2.25
  circle A7 centre (12.5, 21.6506) radius 2.25
  circle A8 centre (12.5, -21.6506) radius 2.25
  circle A9 centre (-12.5, -21.6506) radius 2.25
  circle A10 centre (-12.5, 21.6506) radius 2.25
hole "Hole3" at (-12.5, 50, 21.6506) at (-12.5, 50, -21.6506) at (12.5, 50, 21.6506) at (12.5, 50, -21.6506) direction (0, -1, 0) diameter 3.332 depth 25 tip angle 118
